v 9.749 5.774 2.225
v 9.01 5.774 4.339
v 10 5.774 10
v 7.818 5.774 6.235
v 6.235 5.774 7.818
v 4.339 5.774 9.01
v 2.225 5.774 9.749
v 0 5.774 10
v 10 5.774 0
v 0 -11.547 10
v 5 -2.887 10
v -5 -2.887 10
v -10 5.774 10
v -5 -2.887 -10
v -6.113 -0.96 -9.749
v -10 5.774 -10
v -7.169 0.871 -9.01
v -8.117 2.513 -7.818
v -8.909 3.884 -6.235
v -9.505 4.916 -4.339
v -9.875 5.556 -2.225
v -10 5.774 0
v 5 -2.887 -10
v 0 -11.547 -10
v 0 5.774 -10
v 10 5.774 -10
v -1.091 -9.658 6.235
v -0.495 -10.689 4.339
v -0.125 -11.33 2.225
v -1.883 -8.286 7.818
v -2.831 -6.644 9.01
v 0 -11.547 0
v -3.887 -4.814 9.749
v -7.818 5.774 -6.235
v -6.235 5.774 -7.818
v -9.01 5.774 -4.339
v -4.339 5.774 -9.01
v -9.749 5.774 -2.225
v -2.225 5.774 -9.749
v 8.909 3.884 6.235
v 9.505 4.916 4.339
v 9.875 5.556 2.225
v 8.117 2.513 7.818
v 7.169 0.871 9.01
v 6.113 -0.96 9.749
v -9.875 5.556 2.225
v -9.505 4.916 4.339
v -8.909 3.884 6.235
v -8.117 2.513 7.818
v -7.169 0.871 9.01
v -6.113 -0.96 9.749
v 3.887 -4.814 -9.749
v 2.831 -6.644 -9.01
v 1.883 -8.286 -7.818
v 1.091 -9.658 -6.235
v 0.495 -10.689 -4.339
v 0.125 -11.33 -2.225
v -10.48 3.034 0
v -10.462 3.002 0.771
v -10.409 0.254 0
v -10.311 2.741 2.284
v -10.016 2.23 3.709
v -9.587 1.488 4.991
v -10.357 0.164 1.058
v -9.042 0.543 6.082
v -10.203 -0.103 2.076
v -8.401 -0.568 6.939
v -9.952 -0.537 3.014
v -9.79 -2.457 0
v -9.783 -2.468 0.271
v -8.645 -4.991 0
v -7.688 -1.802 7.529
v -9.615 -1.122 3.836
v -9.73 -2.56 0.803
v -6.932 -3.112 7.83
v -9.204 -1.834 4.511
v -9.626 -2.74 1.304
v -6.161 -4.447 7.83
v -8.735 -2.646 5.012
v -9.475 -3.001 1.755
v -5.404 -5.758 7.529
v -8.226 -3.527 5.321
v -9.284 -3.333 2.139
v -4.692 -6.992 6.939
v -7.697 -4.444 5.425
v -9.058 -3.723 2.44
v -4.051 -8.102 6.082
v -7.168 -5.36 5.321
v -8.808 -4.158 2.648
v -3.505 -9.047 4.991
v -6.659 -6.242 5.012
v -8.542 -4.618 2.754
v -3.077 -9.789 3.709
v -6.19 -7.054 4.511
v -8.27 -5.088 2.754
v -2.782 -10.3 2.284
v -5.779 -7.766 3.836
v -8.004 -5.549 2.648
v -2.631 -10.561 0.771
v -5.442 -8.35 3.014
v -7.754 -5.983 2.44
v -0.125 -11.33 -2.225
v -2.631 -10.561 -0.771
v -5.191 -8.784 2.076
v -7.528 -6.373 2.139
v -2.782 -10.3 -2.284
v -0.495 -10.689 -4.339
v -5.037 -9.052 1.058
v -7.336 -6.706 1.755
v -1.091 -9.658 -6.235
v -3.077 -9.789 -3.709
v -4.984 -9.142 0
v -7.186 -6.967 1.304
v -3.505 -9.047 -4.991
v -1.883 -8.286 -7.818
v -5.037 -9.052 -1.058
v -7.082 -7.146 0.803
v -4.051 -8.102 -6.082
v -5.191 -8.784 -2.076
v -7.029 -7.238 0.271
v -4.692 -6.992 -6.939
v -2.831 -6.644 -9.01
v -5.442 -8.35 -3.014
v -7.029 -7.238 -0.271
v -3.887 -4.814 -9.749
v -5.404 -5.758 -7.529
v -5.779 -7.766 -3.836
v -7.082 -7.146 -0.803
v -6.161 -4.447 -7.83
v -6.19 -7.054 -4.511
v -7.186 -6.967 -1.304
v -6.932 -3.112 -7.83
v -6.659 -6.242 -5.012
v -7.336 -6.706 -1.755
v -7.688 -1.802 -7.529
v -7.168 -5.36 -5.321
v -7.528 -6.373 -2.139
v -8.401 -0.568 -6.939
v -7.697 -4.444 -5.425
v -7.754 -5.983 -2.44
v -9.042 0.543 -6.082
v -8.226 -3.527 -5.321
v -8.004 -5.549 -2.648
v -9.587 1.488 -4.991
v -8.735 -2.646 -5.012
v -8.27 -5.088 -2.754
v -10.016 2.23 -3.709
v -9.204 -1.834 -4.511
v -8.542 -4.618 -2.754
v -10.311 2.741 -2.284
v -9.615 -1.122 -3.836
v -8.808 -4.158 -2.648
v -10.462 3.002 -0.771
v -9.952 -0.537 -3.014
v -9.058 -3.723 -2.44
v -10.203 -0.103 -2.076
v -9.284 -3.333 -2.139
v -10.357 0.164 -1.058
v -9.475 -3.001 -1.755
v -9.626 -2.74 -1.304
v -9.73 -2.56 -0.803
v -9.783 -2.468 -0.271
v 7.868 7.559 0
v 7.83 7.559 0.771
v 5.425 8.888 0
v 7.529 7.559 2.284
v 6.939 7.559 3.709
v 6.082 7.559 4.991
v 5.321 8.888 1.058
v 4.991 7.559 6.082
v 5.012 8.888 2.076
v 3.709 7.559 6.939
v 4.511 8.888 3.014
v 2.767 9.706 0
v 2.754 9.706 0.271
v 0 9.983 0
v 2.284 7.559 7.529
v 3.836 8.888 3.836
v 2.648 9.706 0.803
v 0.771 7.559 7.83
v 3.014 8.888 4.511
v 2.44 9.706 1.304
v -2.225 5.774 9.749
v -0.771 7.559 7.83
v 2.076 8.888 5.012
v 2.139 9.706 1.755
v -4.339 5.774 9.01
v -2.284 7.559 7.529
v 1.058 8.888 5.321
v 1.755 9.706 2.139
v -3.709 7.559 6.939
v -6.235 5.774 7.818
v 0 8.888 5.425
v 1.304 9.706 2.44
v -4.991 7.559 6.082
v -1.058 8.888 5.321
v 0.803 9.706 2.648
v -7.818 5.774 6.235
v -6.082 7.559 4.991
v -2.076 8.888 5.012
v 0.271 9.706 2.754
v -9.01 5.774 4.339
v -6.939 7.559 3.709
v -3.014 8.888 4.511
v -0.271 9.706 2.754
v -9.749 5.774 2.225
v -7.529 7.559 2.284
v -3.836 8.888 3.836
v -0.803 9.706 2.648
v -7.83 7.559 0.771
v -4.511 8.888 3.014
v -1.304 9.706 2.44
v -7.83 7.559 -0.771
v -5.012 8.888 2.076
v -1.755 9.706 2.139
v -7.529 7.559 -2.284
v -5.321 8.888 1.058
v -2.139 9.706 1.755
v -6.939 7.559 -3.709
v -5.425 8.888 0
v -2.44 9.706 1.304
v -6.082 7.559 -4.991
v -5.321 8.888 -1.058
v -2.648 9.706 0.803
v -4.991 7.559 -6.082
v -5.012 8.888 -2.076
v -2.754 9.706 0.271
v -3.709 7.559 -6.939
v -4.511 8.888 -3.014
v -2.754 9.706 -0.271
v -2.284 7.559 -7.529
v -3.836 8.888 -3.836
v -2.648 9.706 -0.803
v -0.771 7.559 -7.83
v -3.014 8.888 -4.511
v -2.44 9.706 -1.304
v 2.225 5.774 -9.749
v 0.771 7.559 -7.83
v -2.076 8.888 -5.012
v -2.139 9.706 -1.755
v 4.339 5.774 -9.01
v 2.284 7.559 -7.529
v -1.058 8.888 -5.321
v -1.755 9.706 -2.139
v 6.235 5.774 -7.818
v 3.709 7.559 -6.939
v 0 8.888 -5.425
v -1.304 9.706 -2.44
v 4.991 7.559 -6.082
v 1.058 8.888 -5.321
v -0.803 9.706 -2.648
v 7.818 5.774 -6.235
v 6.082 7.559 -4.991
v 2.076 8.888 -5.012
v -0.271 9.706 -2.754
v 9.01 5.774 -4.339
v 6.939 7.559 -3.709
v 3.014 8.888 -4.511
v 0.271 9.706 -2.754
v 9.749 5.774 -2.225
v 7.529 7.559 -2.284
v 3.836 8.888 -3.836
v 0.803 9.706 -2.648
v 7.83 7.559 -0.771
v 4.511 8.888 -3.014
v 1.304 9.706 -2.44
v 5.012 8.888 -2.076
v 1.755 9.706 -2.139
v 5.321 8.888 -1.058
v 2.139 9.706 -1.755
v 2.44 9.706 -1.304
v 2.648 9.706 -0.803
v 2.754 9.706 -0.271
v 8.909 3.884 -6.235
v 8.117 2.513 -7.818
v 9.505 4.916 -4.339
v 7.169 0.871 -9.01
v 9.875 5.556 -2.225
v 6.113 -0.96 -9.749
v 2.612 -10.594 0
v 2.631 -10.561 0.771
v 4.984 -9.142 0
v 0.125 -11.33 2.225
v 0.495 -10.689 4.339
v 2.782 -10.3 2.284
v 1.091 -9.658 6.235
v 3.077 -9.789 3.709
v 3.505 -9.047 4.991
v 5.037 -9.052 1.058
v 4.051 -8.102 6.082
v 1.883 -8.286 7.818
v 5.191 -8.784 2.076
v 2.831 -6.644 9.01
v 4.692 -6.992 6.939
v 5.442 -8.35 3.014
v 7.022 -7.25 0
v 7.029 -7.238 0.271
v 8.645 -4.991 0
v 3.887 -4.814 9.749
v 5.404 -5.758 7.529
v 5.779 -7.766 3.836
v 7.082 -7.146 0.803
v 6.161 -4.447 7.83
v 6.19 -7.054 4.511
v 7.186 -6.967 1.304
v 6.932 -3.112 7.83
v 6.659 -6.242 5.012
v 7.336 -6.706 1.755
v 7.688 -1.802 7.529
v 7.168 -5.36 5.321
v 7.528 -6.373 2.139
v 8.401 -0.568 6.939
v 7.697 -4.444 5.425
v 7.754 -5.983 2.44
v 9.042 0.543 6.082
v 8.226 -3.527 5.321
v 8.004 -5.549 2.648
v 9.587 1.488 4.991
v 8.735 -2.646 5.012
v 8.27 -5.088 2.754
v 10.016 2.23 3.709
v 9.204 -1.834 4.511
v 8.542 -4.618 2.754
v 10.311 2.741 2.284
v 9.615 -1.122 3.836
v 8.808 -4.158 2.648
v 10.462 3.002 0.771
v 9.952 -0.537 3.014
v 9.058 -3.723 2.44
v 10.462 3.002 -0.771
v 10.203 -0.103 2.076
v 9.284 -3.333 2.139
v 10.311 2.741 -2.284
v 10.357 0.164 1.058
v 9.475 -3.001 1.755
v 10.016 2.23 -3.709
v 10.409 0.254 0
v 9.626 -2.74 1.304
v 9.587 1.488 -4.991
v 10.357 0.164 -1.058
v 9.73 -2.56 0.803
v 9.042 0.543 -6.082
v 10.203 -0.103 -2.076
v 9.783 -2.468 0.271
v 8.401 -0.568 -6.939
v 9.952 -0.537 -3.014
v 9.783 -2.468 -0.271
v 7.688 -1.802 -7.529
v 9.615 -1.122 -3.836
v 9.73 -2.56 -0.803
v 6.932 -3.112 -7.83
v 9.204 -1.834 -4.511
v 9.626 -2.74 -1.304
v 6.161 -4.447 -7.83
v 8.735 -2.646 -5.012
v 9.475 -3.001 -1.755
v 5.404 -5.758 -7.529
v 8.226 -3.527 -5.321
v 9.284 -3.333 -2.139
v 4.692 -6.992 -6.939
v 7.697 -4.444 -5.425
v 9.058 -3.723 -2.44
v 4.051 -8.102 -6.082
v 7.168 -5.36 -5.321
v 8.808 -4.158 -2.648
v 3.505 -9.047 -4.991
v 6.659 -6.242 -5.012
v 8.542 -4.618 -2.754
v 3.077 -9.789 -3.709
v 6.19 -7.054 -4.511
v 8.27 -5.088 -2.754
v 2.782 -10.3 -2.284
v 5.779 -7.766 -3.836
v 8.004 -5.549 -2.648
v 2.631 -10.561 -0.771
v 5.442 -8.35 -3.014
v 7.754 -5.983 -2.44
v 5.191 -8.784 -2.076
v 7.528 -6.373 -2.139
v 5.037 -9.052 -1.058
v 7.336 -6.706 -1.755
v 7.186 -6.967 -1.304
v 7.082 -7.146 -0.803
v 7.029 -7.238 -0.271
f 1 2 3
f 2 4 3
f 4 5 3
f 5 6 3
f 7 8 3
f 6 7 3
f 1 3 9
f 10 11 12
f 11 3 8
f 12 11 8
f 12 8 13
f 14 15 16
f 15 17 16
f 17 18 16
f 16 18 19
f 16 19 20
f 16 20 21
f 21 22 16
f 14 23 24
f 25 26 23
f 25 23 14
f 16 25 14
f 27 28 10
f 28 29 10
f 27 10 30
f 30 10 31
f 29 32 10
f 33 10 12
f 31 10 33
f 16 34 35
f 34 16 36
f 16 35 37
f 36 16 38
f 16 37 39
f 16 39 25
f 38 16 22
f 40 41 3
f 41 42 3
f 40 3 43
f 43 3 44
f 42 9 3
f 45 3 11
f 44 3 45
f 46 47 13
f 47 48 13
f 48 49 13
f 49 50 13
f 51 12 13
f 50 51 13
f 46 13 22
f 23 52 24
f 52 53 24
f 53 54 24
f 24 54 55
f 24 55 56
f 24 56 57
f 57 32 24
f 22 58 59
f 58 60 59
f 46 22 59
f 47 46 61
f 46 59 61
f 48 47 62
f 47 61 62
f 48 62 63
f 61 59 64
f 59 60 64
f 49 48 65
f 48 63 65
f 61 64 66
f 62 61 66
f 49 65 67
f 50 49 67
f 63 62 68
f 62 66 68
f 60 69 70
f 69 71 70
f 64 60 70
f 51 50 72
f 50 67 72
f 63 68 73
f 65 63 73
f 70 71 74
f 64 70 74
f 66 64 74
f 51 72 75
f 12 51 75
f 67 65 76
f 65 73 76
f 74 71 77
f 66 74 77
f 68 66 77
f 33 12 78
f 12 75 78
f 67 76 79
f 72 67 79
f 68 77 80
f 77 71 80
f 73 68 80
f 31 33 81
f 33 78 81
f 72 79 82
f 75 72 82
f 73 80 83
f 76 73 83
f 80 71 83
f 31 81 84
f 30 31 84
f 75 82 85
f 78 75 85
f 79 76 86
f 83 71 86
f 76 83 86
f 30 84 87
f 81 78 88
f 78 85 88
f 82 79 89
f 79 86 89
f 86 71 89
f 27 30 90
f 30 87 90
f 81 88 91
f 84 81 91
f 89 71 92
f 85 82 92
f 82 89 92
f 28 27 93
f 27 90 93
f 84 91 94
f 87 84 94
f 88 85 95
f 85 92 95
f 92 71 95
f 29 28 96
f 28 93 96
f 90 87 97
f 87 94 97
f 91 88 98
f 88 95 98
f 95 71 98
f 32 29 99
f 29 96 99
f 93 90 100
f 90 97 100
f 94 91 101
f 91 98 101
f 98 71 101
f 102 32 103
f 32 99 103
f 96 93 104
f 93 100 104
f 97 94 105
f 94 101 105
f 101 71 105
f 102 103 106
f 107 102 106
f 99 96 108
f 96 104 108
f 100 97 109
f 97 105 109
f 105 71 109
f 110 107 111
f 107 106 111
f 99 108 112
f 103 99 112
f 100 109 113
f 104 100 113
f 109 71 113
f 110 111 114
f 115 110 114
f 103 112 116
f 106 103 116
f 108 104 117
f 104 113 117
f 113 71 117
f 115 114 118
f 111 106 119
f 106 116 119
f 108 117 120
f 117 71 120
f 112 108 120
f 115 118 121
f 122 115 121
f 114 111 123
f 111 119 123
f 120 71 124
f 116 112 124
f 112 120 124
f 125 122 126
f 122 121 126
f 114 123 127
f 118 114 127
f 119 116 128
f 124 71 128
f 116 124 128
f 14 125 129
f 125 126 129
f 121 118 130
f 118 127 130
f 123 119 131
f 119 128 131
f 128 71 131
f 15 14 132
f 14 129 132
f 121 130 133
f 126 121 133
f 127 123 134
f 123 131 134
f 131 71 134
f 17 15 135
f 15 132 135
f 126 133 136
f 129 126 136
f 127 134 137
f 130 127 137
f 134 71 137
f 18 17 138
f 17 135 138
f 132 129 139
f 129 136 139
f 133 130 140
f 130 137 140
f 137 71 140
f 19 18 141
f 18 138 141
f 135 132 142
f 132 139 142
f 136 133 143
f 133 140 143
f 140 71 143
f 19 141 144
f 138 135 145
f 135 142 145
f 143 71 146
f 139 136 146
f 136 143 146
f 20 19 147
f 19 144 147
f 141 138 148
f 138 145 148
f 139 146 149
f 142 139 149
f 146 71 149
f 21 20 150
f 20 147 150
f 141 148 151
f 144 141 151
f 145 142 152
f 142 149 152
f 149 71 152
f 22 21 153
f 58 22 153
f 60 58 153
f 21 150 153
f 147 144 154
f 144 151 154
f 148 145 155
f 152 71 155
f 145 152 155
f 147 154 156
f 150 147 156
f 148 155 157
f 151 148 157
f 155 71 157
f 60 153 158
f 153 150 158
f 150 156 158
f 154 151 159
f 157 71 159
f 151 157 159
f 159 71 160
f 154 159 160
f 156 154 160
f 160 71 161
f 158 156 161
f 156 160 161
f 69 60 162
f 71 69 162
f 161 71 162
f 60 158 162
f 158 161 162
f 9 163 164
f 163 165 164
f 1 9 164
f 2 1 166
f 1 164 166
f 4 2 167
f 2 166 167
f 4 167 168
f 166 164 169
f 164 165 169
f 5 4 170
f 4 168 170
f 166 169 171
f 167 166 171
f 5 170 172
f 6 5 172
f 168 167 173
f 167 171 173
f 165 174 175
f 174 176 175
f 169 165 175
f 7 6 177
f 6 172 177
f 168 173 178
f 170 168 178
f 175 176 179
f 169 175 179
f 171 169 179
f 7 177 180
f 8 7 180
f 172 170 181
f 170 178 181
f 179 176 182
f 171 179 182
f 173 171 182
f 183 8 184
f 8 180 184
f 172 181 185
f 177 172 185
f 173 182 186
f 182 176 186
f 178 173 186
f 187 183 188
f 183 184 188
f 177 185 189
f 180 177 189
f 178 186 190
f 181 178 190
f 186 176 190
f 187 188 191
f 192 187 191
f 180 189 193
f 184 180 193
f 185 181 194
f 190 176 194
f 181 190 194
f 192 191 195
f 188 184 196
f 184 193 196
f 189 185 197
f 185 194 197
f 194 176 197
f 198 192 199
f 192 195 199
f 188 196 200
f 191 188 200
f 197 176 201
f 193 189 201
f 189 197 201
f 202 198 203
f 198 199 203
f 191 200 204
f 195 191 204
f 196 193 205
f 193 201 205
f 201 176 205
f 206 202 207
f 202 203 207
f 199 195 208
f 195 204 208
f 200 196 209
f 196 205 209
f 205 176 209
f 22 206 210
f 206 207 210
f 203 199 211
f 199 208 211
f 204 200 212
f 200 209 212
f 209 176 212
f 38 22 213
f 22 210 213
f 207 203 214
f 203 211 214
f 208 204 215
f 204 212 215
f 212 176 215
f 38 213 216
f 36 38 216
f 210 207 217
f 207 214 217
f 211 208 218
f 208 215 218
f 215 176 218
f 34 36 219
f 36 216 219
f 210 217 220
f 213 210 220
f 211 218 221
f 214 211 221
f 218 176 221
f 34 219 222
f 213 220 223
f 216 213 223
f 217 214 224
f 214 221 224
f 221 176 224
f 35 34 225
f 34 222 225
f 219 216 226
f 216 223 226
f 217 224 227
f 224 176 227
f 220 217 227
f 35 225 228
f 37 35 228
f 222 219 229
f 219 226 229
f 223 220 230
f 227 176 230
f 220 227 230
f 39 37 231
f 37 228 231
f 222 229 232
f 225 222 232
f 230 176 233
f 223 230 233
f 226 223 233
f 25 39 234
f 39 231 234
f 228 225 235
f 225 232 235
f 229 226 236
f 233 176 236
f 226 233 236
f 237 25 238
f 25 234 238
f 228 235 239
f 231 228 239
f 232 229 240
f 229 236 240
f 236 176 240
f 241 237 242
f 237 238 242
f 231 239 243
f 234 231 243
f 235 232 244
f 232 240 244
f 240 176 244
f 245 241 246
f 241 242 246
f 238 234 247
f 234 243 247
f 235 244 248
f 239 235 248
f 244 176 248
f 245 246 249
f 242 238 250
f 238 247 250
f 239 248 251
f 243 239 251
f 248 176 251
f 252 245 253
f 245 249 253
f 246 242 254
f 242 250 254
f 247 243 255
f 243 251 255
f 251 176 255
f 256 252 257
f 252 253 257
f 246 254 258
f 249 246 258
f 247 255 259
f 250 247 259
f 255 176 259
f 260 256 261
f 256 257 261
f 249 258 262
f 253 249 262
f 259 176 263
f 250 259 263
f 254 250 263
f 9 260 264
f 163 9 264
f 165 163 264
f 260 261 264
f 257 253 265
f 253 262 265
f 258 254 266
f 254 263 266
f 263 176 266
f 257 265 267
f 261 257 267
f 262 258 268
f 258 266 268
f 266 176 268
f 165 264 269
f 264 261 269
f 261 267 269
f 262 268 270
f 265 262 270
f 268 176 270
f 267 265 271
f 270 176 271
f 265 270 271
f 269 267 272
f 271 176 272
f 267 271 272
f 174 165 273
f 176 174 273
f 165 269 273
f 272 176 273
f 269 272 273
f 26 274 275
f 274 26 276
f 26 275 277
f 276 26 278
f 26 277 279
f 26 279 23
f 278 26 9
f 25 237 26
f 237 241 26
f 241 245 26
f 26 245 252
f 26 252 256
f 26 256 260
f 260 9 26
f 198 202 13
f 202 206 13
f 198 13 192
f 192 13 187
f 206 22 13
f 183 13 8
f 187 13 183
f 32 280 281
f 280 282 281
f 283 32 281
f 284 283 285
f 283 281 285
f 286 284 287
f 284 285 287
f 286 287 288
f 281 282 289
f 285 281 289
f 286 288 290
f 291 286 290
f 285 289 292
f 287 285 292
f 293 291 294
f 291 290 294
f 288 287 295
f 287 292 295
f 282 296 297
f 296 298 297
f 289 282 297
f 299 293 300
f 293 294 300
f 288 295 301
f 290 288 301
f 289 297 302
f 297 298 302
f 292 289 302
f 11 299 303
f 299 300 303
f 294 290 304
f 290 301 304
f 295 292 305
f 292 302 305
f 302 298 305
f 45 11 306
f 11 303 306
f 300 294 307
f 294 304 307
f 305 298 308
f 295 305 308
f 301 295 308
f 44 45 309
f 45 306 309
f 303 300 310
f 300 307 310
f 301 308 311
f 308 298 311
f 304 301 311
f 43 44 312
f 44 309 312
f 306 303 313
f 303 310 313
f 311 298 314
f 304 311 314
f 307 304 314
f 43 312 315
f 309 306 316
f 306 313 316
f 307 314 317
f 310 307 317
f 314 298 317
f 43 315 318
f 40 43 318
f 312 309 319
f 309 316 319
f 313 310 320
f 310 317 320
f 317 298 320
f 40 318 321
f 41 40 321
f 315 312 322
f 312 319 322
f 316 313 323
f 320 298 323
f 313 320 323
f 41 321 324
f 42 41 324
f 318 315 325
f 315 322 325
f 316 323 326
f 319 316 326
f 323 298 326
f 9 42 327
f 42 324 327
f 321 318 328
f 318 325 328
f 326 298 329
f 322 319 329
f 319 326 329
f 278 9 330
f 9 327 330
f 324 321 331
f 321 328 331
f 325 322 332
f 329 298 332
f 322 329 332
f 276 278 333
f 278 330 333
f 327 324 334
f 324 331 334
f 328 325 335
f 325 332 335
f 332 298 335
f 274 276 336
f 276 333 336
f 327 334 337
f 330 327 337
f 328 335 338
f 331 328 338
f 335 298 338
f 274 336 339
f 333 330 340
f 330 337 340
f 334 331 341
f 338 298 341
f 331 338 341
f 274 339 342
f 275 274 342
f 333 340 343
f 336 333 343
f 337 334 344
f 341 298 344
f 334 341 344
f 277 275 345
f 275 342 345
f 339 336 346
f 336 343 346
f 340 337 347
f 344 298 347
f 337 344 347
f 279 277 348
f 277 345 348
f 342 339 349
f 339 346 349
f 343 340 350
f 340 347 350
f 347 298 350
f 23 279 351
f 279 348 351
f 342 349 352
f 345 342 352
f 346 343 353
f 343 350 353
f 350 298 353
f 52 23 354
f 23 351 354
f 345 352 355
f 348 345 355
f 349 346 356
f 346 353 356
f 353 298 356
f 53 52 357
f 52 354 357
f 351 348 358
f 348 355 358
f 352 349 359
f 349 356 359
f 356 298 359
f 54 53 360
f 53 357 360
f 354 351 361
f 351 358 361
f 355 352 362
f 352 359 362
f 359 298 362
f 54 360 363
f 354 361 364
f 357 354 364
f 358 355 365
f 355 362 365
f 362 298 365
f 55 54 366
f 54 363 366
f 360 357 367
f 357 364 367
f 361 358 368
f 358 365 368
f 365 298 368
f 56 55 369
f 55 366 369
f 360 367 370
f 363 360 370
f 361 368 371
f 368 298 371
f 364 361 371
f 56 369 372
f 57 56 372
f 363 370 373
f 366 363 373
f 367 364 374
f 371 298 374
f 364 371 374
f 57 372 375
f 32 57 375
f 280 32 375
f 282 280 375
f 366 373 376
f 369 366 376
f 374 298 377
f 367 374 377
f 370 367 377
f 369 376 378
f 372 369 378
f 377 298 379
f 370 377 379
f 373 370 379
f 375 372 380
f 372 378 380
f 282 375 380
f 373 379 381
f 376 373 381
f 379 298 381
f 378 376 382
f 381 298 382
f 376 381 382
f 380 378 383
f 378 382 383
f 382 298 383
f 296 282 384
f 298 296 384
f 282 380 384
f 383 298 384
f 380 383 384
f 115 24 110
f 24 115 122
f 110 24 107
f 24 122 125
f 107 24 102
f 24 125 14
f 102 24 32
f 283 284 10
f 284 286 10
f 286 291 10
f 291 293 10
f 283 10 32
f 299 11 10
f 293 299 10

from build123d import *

# Parameters (mm, degrees)
BOSS_EXTRUDE1_DEPTH      = 10
BOSS_EXTRUDE1_DEPTH_BACK = 10
CIRPATTERN1_COUNT        = 3


with BuildPart() as part:
    # Sketch2 → Boss-Extrude1 (new, two sides: drawn at the far end of the back side and taken through both)
    with BuildSketch(Plane.XY.offset(-BOSS_EXTRUDE1_DEPTH_BACK)):
        Polygon((0, 5.773502692), (-10, 5.773502692), (0, -11.547005384), (10, 5.773502692), align=None)
    extrude(amount=BOSS_EXTRUDE1_DEPTH + BOSS_EXTRUDE1_DEPTH_BACK)

    # Sketch2<7> → Revolve3 (revolve)
    with BuildSketch(Plane.XY):
        with BuildLine():
            Line((0, 9.982895082), (0, 5.773502692))
            Line((0, 5.773502692), (10, 5.773502692))
            ThreePointArc((10, 5.773502692), (5.424918992, 8.887653347), (0, 9.982895082))
        make_face()
    revolve3 = revolve(axis=Axis((0, 9.982895082, 0), (0, -1, 0)))

    # CirPattern1: Revolve3 ×3 about axis
    cirpattern1_axis = Axis((0, 0, -10), (0, 0, -1))
    for i in range(1, CIRPATTERN1_COUNT):
        add(revolve3.rotate(cirpattern1_axis, i * 360 / CIRPATTERN1_COUNT))


solid = part.part
